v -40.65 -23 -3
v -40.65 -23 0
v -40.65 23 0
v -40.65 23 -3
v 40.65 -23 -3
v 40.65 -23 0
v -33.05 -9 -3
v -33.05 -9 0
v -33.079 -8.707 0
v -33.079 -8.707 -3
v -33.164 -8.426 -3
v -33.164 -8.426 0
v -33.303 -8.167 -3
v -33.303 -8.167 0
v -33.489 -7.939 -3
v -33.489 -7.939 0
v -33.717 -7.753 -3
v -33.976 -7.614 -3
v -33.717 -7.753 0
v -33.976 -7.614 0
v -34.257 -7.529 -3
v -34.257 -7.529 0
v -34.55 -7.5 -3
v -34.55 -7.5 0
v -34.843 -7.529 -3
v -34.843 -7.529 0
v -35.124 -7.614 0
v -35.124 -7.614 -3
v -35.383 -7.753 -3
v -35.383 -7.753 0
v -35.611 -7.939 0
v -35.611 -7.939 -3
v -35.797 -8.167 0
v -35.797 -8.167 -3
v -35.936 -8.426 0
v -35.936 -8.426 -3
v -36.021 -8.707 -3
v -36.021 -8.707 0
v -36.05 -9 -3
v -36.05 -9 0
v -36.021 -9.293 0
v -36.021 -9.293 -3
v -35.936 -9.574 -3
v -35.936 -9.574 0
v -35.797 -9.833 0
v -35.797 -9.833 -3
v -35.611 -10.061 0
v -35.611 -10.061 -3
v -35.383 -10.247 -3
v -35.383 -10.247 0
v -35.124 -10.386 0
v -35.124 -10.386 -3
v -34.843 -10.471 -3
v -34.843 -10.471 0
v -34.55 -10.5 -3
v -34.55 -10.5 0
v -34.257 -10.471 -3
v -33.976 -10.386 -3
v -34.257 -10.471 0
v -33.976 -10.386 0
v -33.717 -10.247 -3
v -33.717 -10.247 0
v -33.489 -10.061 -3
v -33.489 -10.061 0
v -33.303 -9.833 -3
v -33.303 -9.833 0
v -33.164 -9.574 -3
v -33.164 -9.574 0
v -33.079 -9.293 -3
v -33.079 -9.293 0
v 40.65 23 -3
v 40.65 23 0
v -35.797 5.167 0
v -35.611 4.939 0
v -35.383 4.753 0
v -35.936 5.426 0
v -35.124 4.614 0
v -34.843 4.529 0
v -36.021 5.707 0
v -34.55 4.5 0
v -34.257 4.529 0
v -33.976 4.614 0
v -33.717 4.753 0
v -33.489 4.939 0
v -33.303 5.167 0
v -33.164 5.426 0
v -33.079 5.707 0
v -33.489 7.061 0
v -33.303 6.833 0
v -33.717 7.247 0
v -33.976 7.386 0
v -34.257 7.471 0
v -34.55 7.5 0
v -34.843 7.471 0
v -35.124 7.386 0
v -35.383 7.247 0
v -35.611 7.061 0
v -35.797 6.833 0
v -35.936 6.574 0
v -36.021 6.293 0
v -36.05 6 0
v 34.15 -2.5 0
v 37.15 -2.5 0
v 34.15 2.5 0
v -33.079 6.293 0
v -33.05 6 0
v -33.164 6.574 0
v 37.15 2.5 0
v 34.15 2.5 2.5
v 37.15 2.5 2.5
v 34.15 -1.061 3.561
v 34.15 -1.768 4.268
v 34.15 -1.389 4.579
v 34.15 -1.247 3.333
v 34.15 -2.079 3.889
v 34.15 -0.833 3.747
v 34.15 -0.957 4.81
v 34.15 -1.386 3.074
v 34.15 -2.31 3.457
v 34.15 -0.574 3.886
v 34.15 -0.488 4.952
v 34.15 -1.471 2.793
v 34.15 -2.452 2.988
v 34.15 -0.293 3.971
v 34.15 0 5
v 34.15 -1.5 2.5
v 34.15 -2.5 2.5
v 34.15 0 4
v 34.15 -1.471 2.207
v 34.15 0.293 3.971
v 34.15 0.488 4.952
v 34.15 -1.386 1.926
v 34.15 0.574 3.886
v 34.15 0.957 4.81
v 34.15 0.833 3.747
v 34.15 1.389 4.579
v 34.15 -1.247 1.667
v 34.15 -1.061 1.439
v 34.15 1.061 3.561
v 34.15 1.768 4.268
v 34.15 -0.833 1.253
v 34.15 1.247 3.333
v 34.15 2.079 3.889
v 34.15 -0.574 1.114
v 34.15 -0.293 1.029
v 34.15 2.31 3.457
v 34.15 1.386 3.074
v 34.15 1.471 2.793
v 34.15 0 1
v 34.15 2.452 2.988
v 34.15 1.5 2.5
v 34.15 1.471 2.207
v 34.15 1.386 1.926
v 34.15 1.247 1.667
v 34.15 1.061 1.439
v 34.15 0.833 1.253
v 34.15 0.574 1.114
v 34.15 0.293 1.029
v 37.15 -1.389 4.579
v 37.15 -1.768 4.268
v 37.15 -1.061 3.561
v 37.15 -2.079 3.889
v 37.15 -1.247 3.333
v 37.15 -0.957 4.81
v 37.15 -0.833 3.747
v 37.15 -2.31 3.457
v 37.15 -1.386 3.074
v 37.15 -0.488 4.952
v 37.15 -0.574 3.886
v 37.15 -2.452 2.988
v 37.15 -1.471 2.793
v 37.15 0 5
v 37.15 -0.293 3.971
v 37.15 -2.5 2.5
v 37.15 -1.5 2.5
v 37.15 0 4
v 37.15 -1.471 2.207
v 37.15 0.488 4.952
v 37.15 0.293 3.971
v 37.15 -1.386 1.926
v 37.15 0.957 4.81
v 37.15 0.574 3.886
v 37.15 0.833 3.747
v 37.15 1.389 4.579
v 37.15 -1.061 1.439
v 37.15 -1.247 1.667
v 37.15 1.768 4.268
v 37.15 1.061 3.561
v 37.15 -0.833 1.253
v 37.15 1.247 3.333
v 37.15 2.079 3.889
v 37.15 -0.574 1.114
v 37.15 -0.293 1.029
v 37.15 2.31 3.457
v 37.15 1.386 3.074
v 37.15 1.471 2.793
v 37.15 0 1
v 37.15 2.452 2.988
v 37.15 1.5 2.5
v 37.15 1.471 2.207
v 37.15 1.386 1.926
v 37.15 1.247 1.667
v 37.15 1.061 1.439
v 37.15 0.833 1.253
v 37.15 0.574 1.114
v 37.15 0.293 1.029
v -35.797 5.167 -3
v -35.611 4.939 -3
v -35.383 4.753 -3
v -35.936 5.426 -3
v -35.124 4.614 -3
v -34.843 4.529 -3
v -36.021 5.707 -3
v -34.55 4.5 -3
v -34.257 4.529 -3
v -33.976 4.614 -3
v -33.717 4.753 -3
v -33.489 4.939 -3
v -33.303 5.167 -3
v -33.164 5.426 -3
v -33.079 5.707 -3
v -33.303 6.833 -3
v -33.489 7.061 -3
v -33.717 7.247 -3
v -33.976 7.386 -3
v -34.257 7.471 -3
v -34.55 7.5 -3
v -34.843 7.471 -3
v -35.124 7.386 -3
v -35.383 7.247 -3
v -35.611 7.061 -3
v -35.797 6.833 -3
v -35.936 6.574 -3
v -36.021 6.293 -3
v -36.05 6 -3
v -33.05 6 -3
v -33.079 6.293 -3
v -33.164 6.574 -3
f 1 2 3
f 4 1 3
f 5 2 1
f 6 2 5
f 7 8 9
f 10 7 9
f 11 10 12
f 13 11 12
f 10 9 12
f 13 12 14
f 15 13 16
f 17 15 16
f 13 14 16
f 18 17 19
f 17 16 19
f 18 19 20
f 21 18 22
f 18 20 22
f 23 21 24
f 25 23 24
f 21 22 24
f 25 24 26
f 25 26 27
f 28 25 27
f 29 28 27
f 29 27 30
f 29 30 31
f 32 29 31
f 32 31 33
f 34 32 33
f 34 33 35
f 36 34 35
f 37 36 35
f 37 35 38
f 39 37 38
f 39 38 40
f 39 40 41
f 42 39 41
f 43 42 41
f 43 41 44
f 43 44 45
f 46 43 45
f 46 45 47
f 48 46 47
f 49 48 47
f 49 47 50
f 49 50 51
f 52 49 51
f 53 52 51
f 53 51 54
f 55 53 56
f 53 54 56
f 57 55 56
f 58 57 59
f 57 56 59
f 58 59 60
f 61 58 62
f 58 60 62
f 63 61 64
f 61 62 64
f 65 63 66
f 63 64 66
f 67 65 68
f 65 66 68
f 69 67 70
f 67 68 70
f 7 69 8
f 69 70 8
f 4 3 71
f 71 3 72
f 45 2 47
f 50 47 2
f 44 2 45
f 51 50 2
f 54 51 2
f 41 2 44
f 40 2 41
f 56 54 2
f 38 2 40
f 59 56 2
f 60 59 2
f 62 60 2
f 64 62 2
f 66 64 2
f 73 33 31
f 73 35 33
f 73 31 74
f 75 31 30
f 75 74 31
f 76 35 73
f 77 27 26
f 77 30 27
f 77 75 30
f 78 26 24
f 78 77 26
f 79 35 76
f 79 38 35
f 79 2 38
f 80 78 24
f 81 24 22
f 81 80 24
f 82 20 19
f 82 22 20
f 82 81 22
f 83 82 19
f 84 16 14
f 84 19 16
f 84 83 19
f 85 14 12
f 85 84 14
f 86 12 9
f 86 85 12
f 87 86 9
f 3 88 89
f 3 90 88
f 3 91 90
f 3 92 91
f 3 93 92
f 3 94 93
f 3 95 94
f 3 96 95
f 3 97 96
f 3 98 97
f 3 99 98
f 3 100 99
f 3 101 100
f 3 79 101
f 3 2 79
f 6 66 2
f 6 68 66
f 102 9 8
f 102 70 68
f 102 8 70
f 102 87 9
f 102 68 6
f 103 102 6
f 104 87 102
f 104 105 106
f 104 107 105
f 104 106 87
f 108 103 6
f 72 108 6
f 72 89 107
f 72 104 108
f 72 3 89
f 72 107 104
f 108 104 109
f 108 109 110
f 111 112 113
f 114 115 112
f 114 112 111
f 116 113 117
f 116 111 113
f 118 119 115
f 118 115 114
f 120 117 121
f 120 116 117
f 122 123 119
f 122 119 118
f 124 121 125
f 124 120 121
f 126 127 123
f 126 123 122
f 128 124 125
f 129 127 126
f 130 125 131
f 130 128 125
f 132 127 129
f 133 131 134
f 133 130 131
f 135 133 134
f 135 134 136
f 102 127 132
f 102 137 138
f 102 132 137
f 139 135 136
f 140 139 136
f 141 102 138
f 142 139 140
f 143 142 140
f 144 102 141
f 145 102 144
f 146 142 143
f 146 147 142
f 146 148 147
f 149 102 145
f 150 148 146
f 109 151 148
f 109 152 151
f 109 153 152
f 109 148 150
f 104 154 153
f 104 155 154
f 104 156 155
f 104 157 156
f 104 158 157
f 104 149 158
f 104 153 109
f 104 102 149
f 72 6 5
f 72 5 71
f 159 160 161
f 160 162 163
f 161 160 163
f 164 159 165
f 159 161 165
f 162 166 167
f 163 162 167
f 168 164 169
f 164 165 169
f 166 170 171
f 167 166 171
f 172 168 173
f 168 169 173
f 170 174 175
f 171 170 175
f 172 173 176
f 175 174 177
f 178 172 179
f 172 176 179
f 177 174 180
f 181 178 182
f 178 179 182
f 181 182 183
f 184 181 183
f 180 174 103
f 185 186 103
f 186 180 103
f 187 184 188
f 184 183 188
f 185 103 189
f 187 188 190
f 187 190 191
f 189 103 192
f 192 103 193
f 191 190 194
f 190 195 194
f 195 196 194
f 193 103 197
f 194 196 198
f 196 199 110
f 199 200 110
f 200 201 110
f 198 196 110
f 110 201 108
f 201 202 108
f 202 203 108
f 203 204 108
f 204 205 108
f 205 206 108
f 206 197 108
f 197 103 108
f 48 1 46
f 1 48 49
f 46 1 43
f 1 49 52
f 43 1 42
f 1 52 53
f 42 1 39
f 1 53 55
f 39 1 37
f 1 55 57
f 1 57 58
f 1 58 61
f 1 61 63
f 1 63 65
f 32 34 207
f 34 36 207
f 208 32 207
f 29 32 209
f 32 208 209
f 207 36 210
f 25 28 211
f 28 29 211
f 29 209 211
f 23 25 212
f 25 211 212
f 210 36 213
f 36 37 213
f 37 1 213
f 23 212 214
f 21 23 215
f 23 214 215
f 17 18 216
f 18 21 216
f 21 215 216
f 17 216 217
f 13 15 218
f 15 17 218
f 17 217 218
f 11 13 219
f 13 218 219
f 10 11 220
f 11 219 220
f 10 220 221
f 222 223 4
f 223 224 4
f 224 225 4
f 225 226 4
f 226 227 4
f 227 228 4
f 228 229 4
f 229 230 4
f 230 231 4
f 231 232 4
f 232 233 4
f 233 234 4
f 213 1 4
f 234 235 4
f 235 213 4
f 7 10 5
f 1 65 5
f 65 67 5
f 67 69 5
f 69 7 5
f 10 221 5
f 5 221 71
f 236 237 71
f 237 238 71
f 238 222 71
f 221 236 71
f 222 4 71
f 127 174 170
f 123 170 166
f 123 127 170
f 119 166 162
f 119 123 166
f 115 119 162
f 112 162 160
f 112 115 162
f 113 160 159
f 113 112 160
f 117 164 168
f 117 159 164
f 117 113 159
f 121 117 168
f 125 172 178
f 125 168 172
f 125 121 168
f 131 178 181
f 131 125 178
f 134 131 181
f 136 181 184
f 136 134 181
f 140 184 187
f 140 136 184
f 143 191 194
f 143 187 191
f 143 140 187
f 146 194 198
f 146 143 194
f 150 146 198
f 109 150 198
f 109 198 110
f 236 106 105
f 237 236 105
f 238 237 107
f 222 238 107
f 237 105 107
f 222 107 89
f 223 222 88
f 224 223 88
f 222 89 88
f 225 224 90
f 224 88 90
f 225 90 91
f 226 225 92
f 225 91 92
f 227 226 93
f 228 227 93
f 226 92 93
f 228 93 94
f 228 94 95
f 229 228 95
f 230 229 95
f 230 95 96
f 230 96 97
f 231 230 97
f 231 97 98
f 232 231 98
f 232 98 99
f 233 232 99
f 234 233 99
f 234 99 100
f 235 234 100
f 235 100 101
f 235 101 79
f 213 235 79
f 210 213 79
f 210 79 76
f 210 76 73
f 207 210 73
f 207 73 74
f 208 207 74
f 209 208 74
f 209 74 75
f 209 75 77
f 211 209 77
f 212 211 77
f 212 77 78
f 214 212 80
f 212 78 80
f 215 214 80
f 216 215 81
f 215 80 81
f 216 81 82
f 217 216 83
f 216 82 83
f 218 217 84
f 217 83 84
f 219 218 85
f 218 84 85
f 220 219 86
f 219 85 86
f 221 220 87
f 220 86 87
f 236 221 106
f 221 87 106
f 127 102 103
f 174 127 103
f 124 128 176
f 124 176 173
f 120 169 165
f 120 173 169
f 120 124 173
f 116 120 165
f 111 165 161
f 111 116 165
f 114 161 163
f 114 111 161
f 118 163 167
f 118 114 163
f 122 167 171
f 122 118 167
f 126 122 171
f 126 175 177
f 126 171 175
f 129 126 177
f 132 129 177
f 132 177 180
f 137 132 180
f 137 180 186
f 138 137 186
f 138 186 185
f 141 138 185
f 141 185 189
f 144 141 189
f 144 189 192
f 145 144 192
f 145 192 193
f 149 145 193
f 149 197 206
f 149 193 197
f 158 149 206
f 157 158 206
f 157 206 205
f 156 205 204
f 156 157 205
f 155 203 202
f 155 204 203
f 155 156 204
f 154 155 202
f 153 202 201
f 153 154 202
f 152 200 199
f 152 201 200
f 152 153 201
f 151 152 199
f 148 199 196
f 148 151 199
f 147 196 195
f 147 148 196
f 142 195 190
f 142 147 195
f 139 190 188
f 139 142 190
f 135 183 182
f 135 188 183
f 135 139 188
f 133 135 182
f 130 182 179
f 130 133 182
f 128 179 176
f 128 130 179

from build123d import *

# Parameters (mm, degrees)
SKETCH1_W           = 81.3
SKETCH1_H           = 46
BOSS_EXTRUDE1_DEPTH = 3
SKETCH5_W           = 3
SKETCH5_H           = 5
BOSS_EXTRUDE3_DEPTH = 5
SKETCH6_R           = 1.5
CUT_EXTRUDE2_DEPTH  = 47.972571784
FILLET5_RADIUS      = 2.5
FILLET5_LENGTH      = 3
SKETCH7_R           = 1.5
CUT_EXTRUDE3_DEPTH  = 10


with BuildPart() as part:
    # Sketch1 → Boss-Extrude1 (new body)
    with BuildSketch(Plane.XY):
        Rectangle(SKETCH1_W, SKETCH1_H)
    extrude(amount=-BOSS_EXTRUDE1_DEPTH)

    # Sketch5 → Boss-Extrude3 (add)
    with BuildSketch(Plane.XY):
        with Locations((35.65, 0)):
            Rectangle(SKETCH5_W, SKETCH5_H)
    extrude(amount=BOSS_EXTRUDE3_DEPTH)

    # Sketch6 → Cut-Extrude2 (cut, through all)
    with BuildSketch(Plane(origin=(0, 0, 0), x_dir=(0, 0, -1), z_dir=(1, 0, 0))):
        with Locations(Location((-2.5, 0, 0), (0, 0, 180))):
            Circle(SKETCH6_R)
    extrude(amount=CUT_EXTRUDE2_DEPTH, mode=Mode.SUBTRACT)

    # Fillet5: full round fillet: the end face becomes a half cylinder, R = half its width
    fillet5_face = Plane((35.65, 0, 5), x_dir=(-1, 0, 0), z_dir=(0, 0, 1))  # on the end face: x along it, z out of the body
    fillet5_slab = fillet5_face.offset(-FILLET5_RADIUS / 2) * Box(FILLET5_LENGTH, 2 * FILLET5_RADIUS, FILLET5_RADIUS, mode=Mode.PRIVATE)  # the body's end, R deep
    fillet5_round = Plane((35.65, 0, 2.5), x_dir=(0, 0, 1), z_dir=(-1, 0, 0)) * Cylinder(FILLET5_RADIUS, FILLET5_LENGTH, mode=Mode.PRIVATE)  # its axis R under the face
    add(fillet5_slab - fillet5_round, mode=Mode.SUBTRACT)

    # Sketch7 → Cut-Extrude3 (cut)
    with BuildSketch(Plane.XY):
        with Locations((-34.55, -9)):
            Circle(SKETCH7_R)
        with Locations((-34.55, 6)):
            Circle(SKETCH7_R)
    extrude(amount=-CUT_EXTRUDE3_DEPTH, mode=Mode.SUBTRACT)


solid = part.part
